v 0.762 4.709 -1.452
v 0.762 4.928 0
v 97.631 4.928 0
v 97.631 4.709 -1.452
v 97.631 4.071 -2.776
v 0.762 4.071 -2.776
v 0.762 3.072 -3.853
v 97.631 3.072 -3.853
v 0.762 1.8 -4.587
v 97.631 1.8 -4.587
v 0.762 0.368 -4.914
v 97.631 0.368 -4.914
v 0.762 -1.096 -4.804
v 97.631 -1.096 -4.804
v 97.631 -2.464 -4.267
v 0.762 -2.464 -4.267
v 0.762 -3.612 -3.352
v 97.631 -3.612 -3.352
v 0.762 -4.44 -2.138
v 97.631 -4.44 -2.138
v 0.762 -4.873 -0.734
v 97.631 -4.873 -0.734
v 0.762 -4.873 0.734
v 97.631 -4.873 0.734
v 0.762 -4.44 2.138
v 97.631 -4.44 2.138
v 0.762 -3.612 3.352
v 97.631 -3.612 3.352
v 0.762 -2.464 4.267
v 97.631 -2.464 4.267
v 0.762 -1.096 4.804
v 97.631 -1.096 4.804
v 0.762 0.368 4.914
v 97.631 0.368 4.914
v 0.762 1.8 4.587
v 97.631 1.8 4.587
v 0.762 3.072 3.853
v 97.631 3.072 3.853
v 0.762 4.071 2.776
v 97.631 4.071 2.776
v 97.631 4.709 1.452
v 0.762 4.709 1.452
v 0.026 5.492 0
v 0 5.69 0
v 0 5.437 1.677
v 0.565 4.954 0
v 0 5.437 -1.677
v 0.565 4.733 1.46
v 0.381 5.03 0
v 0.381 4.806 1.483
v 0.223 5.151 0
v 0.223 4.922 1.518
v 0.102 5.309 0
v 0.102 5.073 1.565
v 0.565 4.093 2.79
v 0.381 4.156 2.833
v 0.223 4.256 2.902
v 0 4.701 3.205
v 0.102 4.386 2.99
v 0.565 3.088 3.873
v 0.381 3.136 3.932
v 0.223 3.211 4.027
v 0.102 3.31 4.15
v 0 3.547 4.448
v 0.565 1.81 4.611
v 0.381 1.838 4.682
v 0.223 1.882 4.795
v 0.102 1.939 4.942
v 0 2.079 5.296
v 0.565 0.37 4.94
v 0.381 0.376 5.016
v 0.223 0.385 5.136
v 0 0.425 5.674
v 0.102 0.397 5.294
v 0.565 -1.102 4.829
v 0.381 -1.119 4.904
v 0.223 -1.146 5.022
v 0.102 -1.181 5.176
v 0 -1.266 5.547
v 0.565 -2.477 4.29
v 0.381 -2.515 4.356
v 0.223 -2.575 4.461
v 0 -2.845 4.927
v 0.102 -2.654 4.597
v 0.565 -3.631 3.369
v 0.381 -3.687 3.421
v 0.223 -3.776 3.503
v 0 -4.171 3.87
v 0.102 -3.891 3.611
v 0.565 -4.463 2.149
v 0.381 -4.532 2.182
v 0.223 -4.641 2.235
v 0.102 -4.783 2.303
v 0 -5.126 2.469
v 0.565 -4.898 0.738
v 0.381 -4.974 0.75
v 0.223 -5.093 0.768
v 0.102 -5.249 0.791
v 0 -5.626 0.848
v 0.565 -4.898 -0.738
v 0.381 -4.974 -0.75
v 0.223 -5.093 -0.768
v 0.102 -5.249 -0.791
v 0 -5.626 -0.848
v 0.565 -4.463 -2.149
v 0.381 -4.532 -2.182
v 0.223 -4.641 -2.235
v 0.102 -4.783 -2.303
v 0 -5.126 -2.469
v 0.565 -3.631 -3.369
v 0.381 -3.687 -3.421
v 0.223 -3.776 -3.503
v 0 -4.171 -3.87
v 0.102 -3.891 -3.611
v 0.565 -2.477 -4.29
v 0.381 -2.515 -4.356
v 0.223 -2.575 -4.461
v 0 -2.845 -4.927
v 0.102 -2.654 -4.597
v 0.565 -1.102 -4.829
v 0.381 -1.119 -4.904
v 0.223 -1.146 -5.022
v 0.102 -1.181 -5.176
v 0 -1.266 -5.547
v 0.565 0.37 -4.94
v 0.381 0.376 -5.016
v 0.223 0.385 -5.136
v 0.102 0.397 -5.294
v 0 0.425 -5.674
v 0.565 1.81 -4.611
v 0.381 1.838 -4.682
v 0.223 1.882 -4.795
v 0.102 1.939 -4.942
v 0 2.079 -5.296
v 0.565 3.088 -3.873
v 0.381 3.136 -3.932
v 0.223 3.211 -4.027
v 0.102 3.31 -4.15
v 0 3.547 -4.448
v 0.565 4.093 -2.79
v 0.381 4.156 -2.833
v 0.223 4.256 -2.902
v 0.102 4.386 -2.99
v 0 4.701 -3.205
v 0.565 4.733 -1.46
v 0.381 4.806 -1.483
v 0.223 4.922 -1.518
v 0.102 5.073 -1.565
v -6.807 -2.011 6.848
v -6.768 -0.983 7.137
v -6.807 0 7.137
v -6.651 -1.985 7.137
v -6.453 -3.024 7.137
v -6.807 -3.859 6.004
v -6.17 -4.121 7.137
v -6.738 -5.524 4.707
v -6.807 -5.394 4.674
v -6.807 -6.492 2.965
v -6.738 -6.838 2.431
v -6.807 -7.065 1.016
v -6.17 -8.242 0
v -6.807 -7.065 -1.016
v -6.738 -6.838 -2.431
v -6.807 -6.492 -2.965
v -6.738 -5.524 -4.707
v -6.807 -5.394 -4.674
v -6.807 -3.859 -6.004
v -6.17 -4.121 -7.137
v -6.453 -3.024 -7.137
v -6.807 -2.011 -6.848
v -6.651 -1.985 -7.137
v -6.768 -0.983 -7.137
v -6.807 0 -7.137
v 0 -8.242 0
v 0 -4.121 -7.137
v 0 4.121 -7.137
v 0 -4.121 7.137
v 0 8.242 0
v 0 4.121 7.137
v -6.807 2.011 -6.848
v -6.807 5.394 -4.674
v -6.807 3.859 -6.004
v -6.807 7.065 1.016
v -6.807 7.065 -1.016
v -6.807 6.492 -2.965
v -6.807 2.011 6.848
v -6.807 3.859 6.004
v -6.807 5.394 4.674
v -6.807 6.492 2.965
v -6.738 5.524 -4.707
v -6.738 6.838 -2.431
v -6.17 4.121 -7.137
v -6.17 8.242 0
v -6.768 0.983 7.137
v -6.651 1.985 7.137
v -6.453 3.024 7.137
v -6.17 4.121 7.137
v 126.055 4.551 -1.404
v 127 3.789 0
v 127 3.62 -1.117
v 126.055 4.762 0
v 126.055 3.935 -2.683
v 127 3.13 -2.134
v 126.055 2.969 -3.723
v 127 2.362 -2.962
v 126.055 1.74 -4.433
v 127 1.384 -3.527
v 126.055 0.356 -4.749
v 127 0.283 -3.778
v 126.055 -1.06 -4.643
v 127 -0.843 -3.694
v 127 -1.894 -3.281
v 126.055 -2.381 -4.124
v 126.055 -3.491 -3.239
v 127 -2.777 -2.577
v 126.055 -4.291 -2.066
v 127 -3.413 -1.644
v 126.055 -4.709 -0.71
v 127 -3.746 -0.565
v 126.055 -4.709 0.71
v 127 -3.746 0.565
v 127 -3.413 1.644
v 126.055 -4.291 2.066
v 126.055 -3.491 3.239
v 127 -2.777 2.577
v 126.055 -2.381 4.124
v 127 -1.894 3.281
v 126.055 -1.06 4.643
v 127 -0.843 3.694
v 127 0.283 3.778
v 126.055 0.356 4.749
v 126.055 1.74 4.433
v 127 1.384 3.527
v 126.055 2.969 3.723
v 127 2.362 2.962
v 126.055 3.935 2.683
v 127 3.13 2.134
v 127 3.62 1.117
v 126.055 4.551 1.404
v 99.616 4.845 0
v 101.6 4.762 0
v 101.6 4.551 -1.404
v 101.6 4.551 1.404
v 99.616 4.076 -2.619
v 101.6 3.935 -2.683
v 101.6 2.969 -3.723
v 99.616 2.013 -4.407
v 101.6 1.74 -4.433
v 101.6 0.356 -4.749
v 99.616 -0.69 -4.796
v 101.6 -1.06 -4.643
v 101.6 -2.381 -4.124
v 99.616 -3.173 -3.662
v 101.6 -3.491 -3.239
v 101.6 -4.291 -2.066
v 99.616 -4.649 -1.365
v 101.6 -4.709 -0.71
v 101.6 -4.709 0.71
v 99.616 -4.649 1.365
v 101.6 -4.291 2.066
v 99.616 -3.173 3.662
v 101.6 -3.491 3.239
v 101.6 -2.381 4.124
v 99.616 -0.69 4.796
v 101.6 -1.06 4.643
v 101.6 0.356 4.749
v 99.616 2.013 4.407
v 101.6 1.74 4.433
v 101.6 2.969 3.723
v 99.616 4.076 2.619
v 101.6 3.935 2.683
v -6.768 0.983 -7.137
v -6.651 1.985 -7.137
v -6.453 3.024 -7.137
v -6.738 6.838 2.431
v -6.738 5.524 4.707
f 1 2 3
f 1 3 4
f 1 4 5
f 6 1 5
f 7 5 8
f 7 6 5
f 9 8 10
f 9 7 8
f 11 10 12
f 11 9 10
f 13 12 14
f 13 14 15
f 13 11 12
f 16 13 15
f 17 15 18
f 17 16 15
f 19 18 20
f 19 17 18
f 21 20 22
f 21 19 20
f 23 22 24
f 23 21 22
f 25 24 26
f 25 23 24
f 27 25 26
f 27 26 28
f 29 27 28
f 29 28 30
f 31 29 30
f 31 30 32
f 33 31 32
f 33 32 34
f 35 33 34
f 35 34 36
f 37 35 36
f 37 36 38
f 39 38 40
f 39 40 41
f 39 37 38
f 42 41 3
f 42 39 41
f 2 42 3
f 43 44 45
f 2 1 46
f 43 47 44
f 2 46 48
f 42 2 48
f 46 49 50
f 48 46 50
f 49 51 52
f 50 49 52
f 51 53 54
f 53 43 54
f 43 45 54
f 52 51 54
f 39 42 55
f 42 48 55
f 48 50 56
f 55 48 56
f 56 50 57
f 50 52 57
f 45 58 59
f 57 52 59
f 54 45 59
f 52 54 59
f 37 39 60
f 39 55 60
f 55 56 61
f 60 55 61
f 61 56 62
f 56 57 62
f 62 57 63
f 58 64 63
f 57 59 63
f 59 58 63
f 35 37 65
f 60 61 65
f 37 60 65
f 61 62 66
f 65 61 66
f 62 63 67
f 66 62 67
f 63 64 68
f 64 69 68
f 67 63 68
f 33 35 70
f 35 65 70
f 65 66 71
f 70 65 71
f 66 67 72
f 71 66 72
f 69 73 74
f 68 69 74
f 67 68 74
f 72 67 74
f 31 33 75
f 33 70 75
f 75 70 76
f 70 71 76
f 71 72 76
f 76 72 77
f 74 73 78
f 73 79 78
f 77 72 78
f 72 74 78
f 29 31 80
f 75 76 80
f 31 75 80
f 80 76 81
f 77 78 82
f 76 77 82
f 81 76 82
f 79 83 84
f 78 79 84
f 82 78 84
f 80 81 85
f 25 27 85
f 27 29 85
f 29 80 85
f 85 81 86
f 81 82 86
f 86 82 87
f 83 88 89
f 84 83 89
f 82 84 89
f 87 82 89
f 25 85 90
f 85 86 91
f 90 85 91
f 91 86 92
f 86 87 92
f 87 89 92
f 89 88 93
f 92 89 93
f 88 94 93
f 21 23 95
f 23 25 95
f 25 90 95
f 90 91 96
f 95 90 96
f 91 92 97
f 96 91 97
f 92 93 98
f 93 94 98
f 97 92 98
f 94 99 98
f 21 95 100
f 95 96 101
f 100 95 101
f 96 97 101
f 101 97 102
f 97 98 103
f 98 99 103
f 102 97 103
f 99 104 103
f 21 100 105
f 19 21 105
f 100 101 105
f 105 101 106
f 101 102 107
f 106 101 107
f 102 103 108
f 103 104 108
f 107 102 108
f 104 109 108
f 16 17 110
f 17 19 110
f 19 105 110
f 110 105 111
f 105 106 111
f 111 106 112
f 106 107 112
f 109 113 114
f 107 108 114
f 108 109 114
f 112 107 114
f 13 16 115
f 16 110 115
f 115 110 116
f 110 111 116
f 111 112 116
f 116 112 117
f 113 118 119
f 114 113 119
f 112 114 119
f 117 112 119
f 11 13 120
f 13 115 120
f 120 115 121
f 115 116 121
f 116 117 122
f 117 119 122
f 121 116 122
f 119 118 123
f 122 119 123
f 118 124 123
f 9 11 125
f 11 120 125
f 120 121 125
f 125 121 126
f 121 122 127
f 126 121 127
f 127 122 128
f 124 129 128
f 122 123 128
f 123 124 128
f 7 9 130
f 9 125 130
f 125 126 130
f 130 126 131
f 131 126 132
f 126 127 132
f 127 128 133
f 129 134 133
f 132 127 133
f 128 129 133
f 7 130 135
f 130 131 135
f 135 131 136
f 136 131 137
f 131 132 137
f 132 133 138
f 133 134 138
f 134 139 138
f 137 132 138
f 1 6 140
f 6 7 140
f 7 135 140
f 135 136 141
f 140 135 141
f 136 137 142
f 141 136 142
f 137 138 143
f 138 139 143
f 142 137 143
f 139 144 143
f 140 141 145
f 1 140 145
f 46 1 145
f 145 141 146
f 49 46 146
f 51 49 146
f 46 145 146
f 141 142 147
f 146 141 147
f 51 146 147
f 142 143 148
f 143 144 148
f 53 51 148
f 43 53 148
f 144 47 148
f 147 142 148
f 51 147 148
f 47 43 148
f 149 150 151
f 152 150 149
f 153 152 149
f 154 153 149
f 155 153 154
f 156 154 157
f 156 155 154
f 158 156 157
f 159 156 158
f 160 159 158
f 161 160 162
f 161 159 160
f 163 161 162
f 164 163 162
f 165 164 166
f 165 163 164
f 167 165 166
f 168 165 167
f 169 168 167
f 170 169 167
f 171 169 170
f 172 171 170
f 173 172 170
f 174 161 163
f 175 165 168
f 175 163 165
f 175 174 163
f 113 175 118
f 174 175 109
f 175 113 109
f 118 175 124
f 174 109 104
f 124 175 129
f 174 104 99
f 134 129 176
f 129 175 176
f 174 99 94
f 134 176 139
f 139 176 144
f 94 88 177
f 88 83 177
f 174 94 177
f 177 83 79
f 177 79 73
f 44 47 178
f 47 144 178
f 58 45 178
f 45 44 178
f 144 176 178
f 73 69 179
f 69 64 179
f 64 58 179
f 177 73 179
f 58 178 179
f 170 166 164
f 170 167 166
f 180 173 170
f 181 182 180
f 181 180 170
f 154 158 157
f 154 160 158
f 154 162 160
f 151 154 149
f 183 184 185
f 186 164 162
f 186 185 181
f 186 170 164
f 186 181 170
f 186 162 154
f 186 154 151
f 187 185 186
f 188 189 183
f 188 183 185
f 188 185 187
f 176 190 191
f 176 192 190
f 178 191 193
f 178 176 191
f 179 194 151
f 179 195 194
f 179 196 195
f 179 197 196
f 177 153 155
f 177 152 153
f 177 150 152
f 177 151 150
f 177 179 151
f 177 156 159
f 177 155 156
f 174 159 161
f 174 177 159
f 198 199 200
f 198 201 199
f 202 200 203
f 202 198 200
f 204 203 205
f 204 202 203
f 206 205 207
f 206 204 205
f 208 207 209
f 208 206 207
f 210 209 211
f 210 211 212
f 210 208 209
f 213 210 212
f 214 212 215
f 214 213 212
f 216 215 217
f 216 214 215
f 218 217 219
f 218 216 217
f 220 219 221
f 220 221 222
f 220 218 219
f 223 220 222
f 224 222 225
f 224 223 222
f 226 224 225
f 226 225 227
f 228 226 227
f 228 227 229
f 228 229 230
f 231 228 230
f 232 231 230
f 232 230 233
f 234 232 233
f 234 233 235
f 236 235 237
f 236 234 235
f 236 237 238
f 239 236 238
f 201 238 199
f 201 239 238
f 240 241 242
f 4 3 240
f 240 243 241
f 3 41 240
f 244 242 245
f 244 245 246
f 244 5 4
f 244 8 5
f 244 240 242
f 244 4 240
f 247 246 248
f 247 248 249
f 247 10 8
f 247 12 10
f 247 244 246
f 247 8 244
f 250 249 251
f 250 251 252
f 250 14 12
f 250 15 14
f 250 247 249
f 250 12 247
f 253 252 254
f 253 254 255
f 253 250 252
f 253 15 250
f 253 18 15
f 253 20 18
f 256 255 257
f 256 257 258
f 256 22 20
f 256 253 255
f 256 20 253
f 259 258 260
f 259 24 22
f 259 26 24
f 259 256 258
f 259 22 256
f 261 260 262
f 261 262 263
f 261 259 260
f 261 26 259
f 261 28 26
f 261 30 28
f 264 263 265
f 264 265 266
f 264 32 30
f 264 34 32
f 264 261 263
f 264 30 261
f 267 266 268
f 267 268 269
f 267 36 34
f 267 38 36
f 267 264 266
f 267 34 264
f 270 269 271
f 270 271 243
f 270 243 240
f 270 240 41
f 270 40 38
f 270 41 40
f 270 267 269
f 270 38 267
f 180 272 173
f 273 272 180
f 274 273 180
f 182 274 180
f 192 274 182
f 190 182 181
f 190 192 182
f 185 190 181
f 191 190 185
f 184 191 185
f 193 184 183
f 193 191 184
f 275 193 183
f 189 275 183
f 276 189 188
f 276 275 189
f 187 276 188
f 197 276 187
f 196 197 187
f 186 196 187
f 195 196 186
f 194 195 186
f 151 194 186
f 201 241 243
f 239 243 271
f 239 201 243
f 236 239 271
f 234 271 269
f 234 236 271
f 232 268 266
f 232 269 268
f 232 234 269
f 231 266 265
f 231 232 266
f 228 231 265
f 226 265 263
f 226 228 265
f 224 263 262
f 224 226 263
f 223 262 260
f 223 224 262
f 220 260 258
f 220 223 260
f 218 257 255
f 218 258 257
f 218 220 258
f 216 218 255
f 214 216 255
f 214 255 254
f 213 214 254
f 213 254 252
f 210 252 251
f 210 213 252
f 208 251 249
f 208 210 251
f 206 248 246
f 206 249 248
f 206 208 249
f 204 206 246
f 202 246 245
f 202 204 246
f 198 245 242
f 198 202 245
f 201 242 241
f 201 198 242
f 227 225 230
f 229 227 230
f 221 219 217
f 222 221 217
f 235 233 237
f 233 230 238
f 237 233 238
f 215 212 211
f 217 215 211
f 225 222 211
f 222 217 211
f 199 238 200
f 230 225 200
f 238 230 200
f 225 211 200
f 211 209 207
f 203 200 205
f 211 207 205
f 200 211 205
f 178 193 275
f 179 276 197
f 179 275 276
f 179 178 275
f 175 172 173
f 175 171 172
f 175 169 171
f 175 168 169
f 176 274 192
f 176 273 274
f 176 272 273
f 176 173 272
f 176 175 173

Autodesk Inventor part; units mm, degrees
ref_plane "YZ Plane" through (0, 0, 0) normal (1, 0, 0) x (0, 1, 0)
ref_plane "XZ Plane" through (0, 0, 0) normal (0, 1, 0) x (-1, 0, 0)
sketch "Sketch1" plane through (0, 0, 0) normal (0, 0, 1) x (1, 0, 0)
  line L0 (0, 7.1374) -> (0, 4.9276)
  line L1 (101.6, 4.7625) -> (127, 4.7625)
  line L2 (127, 4.7625) -> (127, 0)
  line L3 (127, 0) -> (-0.0001, 0)
  line L4 (-25.4001, 0) -> (152.4, 0) projected
  line L5 (-0.0001, 0) -> (-0.0001, 7.1374)
  line L6 (-0.0001, 7.1374) -> (0, 7.1374)
  line L7 (101.6, 4.7625) -> (97.6311, 4.9276)
  line L8 (97.6311, 4.9276) -> (0, 4.9276)
  line L9 (0, -1.4275) -> (0, 8.5649) projected
  dimension "d0" = 127
  dimension "d1" = 25.4
  dimension "d2" = 9.525
  dimension "d9" = 0.0001
  dimension "d10" = 14.2748
  dimension "d13" = 3.9689
  dimension "d14" = 9.8552
revolve "Body" add sketch "Sketch1" angle 360 about axis through (127, 0, 0) along (-1, 0, 0)
sketch "Sketch2" plane through (-0.0001, 0, 0) normal (-1, 0, 0) x (0, 0, 1)
  line L0 (0, 8.2416) -> (7.1374, 4.1208)
  line L1 (7.1374, 4.1208) -> (7.1374, -4.1208)
  line L2 (7.1374, -4.1208) -> (0, -8.2416)
  line L3 (0, -8.2416) -> (-7.1374, -4.1208)
  line L4 (-7.1374, -4.1208) -> (-7.1374, 4.1208)
  line L5 (-7.1374, 4.1208) -> (0, 8.2416)
  point P0 (0, 0)
  point P1 (0, 0)
  dimension "d11" = 14.2748
extrude "Head" add sketch "Sketch2" along normal blind 6.8072
sketch "Sketch4" plane through (0, 0, 0) normal (0, 0, 1) x (1, 0, 0)
  line L0 (-6.8073, 7.1374) -> (-6.8073, 8.2416)
  line L1 (-6.8073, 8.2416) -> (-6.1698, 8.2416)
  line L2 (-6.1698, 8.2416) -> (-6.8073, 7.1374)
  line L3 (-8.1687, 0) -> (1.3613, 0) projected
  line L4 (-0.0001, 8.2416) -> (-6.8073, 8.2416) projected
  line L5 (-6.8073, 4.1208) -> (-6.8073, 8.2416) projected
  dimension "d5" = 30
  dimension "d19" = 14.2748
revolve "Chamfer1" cut sketch "Sketch4" angle 360 about axis through (-10, 0, 0) along (1, 0, 0)
thread "Thread" size "3/8-16 UNC" class "2A" standard "ANSI Unified Screw Threads" length 25.4
chamfer "Chamfer2" distance 0.9739 distance2 0.9447 1 edges at (127, -4.7625, 0) measured on face at (127, -1.1883, 1.0527)
ref_plane "Work Plane1" through (1.525, 0, 0) normal (0, 0, 1) x (1, 0, 0)
fillet "Fillet2" radius 0.762 1 edges at (0, -4.9276, 0)
equation "\"d0\" = NLG"
equation "\"d1\" = GEL"
equation "\"d2\" = GD"
equation "\"d10\" = SD2"
equation "\"d14\" = BDM"
equation "\"d11\" = SW"
equation "\"d3\" = KOH - SD"
equation "\"d5\" = ANG1"
equation "\"d19\" = SW0"
equation "\"d63\" = R"
equation "\"d15\" = GEL"
equation "\"d6\" = -0.5 * SPD + 0.5 * GD"
equation "\"NLG\" = 127"
equation "\"GD\" = NND"
equation "\"BDM\" = 9.8552"
equation "\"KOH\" = 6.8072"
equation "\"GEL\" = 25.4"
equation "\"SW\" = 14.2748"
equation "\"SW0\" = SW"
equation "\"SPD\" = GD1"
equation "\"SD2\" = SW"
equation "\"SD\" = 0"
equation "\"ANG1\" = 30deg"
equation "\"GAL\" = 3.96875"
equation "\"GUL\" = 0.238 * GAL"
equation "\"R\" = 0.762"
equation "\"d62\" = -NLG - SD + GUL"
equation "\"GD1\" = 7.5773"
equation "\"THREADDIA\" = 9.525"
equation "\"TOA\" = 30deg"
equation "\"NND\" = 9.525"
equation "\"E0\" = 1.155 * SW"
properties part number "ANSI/ASME B18.2.1 - 3/8-16 UNC - 5, HBI" material "Steel, Mild"
